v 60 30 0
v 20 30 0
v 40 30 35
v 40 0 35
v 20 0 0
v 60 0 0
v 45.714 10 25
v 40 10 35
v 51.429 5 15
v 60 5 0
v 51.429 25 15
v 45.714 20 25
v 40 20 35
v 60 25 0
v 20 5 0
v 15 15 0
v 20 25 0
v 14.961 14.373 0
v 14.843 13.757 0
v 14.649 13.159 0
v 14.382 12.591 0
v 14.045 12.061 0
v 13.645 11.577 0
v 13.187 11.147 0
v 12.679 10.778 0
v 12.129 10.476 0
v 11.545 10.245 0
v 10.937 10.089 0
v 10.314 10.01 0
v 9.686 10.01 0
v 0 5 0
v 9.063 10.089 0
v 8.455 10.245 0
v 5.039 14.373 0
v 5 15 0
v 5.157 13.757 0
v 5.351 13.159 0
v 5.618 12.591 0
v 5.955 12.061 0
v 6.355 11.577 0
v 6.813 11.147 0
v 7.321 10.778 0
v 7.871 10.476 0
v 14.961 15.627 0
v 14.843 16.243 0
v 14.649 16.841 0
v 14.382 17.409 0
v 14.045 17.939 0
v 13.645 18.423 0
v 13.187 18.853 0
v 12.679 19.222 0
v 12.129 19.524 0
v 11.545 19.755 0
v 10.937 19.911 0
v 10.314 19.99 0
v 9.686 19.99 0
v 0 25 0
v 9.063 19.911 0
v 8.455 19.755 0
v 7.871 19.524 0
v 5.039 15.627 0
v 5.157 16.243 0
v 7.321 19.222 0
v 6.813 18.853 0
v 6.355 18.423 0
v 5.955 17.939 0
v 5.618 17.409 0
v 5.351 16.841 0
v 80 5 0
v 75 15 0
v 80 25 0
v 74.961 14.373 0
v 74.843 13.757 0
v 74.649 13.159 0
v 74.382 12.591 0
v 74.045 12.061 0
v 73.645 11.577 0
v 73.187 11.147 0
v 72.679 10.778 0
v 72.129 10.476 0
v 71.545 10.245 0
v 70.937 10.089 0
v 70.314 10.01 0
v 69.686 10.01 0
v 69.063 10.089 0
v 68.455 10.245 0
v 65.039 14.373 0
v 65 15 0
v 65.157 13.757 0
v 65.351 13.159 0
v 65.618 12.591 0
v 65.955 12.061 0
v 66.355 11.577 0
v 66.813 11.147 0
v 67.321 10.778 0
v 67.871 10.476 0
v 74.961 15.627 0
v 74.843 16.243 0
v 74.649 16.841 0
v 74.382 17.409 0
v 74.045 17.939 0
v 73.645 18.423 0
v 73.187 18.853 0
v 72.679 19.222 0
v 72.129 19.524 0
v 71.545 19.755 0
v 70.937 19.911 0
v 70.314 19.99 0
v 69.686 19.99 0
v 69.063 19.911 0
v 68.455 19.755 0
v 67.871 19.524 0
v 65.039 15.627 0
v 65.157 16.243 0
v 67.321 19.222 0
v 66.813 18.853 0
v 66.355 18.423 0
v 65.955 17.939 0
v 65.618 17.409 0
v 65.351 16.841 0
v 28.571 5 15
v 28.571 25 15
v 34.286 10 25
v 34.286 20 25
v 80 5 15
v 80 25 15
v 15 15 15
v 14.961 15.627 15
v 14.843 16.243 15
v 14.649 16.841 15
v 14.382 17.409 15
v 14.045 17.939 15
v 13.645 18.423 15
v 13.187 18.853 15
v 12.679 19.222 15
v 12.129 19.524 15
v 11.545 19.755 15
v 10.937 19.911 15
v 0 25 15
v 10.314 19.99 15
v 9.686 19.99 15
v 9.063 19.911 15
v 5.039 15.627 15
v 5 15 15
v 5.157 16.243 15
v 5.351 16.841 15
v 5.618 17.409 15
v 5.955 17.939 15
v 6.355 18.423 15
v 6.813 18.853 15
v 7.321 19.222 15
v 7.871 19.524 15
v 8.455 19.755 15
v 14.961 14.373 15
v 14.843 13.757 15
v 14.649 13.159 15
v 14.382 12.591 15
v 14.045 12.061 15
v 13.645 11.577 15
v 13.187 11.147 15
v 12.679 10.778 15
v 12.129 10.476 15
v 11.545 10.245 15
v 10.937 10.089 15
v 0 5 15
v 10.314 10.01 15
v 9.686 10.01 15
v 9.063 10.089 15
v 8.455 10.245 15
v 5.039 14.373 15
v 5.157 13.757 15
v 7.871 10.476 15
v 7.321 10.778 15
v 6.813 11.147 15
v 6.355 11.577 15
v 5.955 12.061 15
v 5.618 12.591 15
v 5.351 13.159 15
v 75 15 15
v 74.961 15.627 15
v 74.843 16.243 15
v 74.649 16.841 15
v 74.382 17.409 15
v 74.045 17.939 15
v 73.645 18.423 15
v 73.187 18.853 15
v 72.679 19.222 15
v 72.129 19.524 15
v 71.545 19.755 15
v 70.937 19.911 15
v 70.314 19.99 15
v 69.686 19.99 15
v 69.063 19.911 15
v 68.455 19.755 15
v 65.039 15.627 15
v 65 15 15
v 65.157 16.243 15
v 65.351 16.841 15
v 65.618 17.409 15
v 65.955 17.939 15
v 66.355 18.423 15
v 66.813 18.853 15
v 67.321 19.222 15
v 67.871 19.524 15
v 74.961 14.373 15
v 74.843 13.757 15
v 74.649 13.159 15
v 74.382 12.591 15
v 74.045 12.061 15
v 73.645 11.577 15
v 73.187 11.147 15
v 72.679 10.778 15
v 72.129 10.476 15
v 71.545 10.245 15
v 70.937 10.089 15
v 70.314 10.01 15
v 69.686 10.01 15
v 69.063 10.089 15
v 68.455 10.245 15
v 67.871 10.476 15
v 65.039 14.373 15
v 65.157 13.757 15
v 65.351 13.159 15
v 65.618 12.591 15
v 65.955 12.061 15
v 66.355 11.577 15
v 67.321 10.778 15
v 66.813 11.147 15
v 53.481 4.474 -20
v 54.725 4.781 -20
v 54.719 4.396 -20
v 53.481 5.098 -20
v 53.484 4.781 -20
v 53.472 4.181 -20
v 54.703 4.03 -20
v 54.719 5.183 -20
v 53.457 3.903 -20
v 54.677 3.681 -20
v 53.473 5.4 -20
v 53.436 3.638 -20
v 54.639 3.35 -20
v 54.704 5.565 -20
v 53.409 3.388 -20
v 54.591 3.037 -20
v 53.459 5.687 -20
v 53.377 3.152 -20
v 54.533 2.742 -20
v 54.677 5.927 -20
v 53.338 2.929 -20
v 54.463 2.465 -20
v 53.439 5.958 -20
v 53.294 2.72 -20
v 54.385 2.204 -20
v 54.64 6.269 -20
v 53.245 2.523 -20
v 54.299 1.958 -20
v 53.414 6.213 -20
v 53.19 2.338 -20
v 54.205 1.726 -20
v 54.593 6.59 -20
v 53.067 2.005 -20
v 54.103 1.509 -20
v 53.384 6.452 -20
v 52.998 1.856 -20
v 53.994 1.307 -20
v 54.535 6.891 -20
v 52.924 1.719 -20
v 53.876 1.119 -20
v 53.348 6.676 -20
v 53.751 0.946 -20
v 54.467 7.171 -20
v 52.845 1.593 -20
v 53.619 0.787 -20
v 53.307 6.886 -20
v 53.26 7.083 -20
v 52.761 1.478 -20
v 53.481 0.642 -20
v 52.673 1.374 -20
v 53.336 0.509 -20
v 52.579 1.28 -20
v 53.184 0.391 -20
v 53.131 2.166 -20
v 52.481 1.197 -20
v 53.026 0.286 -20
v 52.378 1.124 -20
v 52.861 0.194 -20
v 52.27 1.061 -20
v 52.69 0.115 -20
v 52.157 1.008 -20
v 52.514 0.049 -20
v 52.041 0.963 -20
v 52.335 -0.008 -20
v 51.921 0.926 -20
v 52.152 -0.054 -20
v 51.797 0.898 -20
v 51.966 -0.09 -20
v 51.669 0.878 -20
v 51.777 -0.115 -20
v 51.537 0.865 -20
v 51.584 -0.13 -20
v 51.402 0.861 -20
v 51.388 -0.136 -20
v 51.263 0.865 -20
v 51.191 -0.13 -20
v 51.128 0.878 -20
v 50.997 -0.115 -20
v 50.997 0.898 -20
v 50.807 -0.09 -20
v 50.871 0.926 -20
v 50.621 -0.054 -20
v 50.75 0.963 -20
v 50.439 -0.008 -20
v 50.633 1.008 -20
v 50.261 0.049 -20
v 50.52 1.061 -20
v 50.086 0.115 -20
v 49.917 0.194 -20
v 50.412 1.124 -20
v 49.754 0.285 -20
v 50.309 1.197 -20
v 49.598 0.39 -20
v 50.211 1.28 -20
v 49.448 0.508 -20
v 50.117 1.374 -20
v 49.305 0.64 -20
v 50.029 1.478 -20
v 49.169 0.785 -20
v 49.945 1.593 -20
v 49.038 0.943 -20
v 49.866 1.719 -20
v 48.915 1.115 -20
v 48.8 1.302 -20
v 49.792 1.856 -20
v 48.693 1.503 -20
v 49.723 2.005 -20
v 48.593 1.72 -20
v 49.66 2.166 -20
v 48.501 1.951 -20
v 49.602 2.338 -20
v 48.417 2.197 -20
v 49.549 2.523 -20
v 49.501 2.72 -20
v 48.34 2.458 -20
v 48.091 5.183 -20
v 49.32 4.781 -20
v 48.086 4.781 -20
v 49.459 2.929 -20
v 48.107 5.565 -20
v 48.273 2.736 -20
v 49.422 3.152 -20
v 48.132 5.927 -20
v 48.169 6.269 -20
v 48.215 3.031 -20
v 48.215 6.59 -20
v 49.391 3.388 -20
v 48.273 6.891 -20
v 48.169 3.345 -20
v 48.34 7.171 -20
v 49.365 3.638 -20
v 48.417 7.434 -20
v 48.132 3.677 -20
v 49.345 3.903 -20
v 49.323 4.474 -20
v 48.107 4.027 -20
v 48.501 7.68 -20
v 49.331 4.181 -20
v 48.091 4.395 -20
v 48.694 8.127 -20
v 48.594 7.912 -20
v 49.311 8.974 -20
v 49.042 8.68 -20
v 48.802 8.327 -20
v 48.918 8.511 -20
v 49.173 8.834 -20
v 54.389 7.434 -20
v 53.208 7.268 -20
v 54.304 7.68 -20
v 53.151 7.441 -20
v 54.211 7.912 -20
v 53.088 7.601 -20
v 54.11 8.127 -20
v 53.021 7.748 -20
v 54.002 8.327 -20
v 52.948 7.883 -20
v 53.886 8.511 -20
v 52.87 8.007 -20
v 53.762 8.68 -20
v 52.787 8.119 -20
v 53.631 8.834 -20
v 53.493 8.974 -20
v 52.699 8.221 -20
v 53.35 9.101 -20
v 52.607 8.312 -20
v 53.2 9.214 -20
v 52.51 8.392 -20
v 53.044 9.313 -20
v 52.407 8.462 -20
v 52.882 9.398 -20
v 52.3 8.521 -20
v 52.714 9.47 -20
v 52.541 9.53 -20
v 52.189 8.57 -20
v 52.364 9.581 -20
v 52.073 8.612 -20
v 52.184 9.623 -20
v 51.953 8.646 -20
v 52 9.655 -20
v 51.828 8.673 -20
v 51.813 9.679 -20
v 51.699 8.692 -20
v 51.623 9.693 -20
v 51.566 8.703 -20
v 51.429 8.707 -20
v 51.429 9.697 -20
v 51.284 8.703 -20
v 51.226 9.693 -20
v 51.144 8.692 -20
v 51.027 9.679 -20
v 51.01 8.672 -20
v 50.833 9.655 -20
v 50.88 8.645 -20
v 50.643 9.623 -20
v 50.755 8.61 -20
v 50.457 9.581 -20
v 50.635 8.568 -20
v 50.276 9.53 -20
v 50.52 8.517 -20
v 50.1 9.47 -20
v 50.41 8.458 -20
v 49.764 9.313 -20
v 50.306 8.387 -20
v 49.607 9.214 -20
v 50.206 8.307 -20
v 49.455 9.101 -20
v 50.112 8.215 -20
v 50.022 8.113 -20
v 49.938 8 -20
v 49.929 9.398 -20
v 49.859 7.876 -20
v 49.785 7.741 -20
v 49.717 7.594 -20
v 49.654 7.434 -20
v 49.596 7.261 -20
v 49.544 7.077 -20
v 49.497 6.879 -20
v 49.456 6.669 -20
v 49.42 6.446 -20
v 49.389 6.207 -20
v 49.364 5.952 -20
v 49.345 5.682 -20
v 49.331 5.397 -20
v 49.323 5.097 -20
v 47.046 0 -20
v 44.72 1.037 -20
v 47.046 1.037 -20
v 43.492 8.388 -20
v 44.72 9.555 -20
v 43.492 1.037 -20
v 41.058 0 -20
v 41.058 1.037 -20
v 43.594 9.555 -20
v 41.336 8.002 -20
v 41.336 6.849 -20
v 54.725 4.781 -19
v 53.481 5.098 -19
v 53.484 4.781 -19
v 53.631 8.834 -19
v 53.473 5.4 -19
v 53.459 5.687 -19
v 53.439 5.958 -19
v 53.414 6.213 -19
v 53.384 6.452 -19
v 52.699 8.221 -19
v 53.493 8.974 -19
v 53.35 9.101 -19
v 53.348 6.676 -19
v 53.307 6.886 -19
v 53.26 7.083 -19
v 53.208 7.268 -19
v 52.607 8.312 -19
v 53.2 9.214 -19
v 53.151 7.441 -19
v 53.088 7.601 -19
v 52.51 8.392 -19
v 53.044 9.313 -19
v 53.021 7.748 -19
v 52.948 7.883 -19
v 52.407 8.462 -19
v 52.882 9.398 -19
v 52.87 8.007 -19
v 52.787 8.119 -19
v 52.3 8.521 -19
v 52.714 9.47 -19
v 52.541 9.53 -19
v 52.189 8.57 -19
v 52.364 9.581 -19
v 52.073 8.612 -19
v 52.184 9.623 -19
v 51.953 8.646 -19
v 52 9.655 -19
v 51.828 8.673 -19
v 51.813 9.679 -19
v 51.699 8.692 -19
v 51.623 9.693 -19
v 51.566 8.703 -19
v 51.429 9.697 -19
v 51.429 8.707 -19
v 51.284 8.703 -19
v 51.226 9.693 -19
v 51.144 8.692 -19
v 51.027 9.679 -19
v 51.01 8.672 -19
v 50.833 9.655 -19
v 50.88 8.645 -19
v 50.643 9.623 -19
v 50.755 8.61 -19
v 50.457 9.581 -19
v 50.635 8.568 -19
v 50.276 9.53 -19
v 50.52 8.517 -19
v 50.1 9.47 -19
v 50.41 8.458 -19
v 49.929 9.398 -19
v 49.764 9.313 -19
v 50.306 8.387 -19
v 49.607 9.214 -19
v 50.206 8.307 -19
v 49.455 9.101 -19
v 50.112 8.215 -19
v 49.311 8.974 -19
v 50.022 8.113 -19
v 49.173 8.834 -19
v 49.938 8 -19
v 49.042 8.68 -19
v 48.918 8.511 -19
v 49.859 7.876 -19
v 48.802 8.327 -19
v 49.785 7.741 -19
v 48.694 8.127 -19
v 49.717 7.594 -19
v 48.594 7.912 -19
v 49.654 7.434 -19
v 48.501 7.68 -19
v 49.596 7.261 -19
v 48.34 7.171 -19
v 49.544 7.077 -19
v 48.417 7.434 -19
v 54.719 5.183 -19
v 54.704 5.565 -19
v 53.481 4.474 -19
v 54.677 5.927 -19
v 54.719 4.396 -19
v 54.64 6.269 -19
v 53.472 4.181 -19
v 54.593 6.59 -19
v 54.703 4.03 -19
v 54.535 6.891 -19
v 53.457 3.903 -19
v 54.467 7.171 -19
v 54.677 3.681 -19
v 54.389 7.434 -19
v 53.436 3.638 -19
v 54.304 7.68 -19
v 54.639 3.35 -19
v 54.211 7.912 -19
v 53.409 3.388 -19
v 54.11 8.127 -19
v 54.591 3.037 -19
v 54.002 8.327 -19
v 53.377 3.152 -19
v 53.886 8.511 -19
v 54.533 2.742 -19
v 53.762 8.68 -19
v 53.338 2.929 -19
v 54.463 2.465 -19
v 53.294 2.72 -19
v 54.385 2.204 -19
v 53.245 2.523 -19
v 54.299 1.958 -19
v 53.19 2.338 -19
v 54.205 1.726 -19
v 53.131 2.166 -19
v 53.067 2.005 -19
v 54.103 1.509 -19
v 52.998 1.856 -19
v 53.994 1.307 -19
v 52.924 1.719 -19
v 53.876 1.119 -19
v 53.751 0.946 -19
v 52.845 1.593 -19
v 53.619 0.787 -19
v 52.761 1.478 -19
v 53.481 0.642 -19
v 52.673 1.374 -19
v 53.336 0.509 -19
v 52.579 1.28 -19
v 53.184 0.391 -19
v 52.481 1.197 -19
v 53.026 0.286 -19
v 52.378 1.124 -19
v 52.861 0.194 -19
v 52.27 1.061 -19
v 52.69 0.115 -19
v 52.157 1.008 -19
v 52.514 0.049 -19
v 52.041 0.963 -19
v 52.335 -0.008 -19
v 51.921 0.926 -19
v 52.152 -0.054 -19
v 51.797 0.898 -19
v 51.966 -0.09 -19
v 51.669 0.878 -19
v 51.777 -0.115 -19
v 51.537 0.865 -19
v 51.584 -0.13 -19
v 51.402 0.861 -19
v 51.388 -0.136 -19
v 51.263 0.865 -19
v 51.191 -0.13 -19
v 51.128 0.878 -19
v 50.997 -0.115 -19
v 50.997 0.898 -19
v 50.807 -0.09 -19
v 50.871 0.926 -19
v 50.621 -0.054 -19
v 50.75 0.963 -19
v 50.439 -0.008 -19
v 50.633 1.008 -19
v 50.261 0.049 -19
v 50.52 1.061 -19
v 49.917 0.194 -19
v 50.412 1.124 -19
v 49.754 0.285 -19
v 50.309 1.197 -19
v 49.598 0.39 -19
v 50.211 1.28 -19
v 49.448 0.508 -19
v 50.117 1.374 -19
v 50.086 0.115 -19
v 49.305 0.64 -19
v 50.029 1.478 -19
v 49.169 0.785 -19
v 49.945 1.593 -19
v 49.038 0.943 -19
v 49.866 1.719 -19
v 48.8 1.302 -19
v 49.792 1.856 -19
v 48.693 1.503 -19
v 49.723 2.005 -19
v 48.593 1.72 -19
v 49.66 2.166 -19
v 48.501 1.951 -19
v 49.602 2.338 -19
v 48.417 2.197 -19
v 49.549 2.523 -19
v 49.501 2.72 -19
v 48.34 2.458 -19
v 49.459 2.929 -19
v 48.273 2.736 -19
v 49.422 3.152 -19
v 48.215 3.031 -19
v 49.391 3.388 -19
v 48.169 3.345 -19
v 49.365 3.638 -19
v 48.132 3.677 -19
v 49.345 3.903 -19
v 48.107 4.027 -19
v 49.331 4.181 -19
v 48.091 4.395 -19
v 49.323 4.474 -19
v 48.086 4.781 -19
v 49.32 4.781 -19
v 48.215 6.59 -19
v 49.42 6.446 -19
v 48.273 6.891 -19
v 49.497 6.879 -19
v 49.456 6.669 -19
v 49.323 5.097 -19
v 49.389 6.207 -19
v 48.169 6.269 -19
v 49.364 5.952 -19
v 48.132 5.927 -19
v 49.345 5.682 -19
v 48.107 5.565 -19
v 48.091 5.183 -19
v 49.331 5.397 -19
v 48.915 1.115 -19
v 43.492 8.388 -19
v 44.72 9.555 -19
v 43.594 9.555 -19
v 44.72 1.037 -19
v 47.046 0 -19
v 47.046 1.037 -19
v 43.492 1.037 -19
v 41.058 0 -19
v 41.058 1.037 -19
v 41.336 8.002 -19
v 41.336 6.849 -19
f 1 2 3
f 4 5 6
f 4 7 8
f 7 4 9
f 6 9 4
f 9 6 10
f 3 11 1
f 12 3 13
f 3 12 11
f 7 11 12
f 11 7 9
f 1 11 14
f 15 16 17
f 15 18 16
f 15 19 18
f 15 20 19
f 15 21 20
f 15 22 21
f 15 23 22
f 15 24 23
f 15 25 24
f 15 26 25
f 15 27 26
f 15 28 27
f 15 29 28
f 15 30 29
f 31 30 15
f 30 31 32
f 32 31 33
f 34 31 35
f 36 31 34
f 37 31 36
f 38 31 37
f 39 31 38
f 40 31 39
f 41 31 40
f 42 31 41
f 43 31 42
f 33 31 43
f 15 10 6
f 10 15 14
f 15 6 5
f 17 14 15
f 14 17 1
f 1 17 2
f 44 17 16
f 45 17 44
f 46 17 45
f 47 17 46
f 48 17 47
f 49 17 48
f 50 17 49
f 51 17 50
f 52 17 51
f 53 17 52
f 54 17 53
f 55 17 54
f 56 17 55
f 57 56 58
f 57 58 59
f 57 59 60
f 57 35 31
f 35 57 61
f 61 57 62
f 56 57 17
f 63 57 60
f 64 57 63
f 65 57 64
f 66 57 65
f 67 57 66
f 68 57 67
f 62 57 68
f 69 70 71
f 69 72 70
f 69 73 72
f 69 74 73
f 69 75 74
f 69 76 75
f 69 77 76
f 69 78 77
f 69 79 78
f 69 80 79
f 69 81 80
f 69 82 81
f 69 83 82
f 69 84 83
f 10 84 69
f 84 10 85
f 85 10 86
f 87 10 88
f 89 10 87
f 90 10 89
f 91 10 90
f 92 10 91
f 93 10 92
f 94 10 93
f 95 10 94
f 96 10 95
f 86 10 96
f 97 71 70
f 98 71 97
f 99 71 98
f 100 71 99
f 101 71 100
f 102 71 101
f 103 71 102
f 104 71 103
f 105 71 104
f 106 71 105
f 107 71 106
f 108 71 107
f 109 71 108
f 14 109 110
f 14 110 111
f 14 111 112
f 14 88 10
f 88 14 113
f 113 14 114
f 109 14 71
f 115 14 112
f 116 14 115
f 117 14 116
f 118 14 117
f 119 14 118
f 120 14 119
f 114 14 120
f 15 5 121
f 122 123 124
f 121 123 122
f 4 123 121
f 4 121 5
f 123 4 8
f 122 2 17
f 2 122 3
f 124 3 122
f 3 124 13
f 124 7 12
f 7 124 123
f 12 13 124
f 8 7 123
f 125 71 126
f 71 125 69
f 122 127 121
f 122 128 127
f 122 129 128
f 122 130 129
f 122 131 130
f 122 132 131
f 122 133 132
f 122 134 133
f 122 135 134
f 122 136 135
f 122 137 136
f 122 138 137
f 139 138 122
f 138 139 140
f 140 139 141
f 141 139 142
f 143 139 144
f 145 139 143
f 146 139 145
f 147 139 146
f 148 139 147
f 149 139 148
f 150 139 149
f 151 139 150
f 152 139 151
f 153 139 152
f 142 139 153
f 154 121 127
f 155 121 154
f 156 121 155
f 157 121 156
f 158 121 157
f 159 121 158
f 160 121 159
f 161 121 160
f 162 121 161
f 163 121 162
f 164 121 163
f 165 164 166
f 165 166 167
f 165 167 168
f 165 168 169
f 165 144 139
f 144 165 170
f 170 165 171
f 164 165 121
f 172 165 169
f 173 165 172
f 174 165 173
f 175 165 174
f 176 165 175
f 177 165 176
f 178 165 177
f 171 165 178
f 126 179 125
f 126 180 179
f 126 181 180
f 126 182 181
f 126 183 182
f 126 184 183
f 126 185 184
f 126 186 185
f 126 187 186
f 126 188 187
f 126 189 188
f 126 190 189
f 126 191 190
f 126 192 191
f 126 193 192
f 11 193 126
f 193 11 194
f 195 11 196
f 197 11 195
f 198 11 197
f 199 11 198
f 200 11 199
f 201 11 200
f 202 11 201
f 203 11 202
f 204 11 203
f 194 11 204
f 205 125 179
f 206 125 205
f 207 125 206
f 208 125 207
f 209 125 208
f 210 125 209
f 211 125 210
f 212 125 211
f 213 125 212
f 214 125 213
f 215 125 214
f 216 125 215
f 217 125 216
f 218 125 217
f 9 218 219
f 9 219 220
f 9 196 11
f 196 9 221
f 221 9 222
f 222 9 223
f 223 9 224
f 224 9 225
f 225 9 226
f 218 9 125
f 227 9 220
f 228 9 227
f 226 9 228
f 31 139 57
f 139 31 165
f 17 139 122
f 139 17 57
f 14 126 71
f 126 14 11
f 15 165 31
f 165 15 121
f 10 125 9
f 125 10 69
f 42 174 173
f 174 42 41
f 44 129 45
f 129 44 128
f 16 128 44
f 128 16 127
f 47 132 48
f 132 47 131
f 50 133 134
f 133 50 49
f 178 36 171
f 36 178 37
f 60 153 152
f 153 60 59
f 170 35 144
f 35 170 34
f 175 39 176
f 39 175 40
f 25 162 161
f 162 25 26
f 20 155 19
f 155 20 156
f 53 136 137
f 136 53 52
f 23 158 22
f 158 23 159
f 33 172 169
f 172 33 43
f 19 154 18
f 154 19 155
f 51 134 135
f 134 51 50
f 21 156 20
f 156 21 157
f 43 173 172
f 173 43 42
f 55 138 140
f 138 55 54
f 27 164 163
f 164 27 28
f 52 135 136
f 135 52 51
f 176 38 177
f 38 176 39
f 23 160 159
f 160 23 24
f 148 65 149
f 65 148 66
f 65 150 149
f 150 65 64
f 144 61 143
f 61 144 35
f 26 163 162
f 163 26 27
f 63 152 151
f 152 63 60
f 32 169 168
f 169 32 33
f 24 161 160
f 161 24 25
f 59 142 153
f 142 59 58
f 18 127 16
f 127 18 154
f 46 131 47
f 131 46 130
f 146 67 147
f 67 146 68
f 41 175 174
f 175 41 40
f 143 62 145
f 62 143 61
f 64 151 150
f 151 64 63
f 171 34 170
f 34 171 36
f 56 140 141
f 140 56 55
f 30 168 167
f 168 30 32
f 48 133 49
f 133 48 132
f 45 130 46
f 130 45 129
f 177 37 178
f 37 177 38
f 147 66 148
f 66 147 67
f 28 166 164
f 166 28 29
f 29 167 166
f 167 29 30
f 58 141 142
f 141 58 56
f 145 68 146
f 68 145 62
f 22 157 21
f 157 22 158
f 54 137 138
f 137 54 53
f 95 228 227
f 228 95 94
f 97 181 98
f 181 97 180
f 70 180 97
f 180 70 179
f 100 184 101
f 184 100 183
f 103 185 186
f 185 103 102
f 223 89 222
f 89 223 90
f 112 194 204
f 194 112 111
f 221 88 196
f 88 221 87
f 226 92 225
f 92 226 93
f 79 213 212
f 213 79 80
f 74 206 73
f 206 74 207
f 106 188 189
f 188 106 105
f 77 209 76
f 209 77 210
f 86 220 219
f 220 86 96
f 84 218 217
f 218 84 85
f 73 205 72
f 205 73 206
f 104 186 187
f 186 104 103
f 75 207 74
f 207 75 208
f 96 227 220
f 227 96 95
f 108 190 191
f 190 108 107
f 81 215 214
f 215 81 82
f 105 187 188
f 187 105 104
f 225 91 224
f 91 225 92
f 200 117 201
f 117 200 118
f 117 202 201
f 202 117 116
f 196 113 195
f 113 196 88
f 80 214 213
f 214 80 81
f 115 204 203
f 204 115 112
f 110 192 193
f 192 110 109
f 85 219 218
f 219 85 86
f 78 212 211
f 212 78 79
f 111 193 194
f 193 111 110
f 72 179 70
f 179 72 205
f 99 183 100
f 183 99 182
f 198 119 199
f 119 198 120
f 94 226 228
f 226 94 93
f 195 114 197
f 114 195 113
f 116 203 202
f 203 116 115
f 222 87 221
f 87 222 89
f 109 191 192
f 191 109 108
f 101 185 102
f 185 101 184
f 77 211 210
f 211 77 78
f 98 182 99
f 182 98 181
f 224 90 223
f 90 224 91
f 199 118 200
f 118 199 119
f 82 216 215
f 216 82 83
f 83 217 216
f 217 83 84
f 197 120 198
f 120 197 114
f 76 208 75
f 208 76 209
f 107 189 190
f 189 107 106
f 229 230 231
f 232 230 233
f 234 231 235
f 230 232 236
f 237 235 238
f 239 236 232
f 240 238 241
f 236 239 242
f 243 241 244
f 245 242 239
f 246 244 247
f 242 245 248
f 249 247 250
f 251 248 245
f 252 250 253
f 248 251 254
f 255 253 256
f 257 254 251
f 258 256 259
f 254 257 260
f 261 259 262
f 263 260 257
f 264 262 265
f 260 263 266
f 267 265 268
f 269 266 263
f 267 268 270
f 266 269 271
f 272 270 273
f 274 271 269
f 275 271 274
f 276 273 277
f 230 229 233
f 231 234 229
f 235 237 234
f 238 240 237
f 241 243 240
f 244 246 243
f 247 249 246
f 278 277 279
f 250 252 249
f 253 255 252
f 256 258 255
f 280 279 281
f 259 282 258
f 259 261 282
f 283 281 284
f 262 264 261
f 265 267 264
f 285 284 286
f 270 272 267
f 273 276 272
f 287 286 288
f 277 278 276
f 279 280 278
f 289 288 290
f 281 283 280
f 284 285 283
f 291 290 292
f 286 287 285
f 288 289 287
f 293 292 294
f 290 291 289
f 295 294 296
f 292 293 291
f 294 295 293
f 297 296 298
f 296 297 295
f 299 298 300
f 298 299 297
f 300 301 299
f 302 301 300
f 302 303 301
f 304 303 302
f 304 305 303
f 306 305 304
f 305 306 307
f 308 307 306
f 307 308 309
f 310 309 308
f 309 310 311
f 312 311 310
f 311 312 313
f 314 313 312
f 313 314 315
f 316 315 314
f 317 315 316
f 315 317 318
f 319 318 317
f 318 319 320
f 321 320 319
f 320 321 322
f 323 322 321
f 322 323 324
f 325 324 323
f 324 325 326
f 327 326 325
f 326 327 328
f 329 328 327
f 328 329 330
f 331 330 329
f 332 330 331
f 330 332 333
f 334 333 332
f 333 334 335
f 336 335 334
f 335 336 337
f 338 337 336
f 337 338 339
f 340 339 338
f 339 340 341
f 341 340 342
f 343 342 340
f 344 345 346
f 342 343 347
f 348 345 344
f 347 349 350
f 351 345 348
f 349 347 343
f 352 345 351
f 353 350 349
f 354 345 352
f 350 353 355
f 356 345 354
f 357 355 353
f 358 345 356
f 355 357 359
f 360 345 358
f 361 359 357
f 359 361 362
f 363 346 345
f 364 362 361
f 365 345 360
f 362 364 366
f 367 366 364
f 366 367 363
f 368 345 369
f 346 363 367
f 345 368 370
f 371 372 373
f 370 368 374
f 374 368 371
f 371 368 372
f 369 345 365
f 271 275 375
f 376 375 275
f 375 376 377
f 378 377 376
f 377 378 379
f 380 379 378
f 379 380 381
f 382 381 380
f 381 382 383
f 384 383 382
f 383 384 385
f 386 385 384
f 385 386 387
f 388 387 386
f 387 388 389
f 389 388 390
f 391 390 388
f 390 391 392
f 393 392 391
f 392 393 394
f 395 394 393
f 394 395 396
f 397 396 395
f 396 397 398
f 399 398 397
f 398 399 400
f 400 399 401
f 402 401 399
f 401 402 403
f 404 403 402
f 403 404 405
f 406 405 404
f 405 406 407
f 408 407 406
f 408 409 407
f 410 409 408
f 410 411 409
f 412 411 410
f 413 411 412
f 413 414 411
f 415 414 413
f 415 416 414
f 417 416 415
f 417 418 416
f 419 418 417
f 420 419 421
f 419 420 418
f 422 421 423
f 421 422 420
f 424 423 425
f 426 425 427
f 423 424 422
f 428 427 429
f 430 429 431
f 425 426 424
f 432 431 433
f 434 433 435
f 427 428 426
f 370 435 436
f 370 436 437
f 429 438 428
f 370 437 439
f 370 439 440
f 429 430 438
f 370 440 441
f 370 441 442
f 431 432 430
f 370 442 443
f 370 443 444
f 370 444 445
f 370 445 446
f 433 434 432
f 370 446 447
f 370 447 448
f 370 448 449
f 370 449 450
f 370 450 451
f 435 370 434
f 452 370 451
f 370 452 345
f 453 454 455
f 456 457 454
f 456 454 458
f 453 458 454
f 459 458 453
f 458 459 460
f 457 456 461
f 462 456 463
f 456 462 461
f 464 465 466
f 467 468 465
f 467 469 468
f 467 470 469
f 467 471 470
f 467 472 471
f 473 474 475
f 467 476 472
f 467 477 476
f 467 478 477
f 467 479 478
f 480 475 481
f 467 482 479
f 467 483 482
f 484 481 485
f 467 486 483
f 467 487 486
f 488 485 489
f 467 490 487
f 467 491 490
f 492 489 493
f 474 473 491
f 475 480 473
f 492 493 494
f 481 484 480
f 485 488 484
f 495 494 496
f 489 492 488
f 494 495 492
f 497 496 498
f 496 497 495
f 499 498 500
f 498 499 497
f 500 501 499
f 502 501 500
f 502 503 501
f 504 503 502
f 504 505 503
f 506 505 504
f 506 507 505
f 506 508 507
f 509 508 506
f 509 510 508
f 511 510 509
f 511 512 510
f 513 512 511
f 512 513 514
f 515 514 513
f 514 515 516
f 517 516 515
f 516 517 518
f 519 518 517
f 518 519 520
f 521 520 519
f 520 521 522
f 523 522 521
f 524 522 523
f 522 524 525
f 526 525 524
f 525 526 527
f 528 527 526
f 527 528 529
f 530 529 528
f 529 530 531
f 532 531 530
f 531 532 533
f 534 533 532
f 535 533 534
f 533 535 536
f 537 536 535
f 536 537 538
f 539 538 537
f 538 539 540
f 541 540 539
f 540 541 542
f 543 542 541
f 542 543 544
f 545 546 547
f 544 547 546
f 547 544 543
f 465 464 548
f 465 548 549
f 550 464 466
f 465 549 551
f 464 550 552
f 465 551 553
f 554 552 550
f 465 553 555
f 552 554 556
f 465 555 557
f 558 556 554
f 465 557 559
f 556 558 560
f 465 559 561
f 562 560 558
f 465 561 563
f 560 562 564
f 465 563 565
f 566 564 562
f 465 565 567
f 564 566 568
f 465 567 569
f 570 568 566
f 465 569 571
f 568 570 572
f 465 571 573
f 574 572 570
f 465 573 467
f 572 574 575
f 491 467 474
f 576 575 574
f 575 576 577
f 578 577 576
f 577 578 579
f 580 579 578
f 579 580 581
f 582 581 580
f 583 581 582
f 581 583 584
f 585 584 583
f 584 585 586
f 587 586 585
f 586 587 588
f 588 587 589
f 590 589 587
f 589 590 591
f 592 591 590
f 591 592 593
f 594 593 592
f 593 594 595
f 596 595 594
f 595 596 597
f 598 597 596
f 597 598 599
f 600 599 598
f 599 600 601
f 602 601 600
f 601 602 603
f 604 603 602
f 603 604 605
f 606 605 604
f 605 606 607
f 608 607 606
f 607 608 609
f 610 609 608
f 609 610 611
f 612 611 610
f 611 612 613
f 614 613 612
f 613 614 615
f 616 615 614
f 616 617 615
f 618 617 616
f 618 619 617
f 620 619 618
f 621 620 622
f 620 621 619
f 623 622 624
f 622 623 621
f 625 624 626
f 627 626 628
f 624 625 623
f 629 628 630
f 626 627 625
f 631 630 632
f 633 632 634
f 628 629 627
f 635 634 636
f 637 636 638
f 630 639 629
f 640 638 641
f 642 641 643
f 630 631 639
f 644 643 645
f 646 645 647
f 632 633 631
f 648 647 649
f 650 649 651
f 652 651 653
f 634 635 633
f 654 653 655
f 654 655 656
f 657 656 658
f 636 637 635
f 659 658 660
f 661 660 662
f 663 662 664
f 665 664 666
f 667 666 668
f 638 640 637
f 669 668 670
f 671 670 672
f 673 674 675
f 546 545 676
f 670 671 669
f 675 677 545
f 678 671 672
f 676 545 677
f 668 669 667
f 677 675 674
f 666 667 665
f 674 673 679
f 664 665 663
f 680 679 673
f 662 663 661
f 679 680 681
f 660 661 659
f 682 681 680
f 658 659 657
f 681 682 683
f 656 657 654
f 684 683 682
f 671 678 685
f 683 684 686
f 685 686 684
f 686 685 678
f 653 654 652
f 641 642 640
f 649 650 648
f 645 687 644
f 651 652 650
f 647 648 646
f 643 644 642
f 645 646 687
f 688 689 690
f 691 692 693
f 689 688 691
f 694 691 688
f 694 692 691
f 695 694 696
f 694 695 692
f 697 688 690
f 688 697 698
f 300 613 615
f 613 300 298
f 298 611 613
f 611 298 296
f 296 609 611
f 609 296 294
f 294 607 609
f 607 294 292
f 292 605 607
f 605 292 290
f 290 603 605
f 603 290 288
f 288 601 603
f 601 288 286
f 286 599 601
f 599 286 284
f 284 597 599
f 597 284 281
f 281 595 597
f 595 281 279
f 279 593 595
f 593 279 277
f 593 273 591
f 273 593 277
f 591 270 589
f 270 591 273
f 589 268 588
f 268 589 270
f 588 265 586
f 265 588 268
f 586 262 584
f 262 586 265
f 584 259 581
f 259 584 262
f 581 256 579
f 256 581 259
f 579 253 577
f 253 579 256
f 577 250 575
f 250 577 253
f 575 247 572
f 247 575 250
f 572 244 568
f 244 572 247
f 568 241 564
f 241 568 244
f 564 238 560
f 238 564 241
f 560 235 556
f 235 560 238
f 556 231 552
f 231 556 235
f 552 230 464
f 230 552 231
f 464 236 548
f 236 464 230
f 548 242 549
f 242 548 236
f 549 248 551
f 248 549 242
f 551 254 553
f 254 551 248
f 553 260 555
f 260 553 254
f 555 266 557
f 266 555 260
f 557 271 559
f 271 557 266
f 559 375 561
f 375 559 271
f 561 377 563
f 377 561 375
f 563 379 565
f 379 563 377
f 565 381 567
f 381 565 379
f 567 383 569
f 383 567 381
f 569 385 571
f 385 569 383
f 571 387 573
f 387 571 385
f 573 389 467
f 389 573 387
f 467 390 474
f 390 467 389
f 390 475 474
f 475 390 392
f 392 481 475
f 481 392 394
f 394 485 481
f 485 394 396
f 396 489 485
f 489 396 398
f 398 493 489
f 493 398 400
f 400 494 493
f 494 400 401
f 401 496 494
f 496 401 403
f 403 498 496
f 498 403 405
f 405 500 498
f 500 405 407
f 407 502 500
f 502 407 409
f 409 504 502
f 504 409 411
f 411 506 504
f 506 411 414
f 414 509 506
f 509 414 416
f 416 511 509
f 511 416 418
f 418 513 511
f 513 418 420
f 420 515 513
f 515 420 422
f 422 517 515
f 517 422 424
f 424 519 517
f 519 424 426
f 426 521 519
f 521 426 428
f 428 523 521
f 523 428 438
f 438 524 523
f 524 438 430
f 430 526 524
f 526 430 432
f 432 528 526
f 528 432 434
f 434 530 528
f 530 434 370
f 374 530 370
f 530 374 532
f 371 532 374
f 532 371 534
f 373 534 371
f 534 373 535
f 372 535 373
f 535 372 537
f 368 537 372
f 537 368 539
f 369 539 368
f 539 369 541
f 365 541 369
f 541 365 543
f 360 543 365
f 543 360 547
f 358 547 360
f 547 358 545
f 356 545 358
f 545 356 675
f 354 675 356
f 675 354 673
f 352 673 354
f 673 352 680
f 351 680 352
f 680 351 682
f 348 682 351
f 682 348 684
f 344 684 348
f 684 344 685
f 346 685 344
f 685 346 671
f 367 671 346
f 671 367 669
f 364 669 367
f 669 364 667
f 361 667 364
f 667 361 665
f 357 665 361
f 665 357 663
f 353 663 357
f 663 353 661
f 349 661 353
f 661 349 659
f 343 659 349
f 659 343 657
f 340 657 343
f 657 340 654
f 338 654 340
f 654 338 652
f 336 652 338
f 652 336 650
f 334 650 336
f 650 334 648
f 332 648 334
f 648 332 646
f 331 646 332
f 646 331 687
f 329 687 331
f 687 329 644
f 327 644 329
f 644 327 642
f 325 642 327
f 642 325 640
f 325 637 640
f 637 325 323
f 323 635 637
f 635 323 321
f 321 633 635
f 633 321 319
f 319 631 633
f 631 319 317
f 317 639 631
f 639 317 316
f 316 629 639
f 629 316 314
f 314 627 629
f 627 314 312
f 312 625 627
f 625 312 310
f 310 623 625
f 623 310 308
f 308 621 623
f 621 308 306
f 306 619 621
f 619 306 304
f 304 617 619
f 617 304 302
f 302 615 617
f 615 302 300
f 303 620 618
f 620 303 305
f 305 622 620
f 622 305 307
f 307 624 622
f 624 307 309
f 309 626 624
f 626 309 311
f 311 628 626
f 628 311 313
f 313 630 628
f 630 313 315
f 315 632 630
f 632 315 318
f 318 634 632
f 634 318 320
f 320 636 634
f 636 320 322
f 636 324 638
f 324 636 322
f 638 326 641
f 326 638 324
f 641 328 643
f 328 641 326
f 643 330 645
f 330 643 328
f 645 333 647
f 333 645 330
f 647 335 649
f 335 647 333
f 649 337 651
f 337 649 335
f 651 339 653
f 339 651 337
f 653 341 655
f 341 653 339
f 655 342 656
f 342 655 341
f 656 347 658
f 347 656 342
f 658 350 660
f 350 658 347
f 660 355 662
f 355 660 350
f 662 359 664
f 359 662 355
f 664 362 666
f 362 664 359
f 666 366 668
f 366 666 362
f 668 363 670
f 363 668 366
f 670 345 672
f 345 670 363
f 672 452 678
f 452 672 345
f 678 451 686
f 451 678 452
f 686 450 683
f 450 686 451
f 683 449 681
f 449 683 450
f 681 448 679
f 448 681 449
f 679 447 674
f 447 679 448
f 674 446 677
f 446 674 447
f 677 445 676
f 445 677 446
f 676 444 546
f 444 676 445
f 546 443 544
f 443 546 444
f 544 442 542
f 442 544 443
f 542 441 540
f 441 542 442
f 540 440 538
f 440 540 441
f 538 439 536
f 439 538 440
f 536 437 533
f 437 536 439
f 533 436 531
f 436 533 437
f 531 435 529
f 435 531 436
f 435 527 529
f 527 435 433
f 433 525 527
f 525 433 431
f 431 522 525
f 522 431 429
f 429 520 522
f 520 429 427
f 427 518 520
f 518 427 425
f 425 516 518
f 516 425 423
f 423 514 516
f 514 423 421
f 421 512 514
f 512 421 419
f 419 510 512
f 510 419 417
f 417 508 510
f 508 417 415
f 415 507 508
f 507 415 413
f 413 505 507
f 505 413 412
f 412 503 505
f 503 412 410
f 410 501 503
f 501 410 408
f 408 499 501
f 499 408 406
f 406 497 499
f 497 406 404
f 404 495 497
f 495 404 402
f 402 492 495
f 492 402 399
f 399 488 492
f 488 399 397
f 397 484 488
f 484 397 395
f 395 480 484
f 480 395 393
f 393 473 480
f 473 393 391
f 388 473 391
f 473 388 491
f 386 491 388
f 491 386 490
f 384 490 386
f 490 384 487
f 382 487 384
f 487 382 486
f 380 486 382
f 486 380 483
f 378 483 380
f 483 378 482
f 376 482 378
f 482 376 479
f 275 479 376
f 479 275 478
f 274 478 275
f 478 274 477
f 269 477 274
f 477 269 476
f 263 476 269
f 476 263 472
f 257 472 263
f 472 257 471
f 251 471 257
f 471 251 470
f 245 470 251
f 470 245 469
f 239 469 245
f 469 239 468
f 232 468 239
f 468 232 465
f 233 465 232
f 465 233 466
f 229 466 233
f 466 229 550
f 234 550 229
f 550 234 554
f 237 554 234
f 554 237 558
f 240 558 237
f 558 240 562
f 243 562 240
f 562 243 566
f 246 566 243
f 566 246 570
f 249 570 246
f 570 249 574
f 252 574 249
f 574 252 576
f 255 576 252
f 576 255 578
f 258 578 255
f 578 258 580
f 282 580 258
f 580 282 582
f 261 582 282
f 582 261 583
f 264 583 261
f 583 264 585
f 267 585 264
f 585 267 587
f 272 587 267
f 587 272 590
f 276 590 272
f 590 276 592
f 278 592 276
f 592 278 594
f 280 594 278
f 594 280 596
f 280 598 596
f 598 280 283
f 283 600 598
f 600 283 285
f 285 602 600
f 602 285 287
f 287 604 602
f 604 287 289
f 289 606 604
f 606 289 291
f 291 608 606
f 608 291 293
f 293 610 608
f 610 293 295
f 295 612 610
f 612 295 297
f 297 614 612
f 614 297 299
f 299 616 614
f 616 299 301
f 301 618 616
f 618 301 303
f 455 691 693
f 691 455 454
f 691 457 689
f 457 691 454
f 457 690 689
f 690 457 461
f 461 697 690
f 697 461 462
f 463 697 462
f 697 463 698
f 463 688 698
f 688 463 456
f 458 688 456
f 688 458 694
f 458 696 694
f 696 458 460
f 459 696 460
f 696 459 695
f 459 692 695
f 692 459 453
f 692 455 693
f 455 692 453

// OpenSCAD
$fn=50;

cw=80;
cd=30;
ch=35;
cy=10;

union() {
    difference() {
        translate([ 0,30,0 ])
        rotate([90,0,0])
        linear_extrude(height=cd)
        polygon([[20,0],[60,0],[40,35]]);
        translate([cw/2-15,cd/2-5,ch-10])
        cube([30,10,10]);
    }
    
    translate([0,5,0])
    difference() {
        cube([cw,cd-10,15]);
        translate([10,10,0])
        cylinder(h=20,d=10);
        translate([70,10,0])
        cylinder(h=20,d=10);
    }
}
translate([cw/2,0,-20])
linear_extrude(height=1)
text("10");
